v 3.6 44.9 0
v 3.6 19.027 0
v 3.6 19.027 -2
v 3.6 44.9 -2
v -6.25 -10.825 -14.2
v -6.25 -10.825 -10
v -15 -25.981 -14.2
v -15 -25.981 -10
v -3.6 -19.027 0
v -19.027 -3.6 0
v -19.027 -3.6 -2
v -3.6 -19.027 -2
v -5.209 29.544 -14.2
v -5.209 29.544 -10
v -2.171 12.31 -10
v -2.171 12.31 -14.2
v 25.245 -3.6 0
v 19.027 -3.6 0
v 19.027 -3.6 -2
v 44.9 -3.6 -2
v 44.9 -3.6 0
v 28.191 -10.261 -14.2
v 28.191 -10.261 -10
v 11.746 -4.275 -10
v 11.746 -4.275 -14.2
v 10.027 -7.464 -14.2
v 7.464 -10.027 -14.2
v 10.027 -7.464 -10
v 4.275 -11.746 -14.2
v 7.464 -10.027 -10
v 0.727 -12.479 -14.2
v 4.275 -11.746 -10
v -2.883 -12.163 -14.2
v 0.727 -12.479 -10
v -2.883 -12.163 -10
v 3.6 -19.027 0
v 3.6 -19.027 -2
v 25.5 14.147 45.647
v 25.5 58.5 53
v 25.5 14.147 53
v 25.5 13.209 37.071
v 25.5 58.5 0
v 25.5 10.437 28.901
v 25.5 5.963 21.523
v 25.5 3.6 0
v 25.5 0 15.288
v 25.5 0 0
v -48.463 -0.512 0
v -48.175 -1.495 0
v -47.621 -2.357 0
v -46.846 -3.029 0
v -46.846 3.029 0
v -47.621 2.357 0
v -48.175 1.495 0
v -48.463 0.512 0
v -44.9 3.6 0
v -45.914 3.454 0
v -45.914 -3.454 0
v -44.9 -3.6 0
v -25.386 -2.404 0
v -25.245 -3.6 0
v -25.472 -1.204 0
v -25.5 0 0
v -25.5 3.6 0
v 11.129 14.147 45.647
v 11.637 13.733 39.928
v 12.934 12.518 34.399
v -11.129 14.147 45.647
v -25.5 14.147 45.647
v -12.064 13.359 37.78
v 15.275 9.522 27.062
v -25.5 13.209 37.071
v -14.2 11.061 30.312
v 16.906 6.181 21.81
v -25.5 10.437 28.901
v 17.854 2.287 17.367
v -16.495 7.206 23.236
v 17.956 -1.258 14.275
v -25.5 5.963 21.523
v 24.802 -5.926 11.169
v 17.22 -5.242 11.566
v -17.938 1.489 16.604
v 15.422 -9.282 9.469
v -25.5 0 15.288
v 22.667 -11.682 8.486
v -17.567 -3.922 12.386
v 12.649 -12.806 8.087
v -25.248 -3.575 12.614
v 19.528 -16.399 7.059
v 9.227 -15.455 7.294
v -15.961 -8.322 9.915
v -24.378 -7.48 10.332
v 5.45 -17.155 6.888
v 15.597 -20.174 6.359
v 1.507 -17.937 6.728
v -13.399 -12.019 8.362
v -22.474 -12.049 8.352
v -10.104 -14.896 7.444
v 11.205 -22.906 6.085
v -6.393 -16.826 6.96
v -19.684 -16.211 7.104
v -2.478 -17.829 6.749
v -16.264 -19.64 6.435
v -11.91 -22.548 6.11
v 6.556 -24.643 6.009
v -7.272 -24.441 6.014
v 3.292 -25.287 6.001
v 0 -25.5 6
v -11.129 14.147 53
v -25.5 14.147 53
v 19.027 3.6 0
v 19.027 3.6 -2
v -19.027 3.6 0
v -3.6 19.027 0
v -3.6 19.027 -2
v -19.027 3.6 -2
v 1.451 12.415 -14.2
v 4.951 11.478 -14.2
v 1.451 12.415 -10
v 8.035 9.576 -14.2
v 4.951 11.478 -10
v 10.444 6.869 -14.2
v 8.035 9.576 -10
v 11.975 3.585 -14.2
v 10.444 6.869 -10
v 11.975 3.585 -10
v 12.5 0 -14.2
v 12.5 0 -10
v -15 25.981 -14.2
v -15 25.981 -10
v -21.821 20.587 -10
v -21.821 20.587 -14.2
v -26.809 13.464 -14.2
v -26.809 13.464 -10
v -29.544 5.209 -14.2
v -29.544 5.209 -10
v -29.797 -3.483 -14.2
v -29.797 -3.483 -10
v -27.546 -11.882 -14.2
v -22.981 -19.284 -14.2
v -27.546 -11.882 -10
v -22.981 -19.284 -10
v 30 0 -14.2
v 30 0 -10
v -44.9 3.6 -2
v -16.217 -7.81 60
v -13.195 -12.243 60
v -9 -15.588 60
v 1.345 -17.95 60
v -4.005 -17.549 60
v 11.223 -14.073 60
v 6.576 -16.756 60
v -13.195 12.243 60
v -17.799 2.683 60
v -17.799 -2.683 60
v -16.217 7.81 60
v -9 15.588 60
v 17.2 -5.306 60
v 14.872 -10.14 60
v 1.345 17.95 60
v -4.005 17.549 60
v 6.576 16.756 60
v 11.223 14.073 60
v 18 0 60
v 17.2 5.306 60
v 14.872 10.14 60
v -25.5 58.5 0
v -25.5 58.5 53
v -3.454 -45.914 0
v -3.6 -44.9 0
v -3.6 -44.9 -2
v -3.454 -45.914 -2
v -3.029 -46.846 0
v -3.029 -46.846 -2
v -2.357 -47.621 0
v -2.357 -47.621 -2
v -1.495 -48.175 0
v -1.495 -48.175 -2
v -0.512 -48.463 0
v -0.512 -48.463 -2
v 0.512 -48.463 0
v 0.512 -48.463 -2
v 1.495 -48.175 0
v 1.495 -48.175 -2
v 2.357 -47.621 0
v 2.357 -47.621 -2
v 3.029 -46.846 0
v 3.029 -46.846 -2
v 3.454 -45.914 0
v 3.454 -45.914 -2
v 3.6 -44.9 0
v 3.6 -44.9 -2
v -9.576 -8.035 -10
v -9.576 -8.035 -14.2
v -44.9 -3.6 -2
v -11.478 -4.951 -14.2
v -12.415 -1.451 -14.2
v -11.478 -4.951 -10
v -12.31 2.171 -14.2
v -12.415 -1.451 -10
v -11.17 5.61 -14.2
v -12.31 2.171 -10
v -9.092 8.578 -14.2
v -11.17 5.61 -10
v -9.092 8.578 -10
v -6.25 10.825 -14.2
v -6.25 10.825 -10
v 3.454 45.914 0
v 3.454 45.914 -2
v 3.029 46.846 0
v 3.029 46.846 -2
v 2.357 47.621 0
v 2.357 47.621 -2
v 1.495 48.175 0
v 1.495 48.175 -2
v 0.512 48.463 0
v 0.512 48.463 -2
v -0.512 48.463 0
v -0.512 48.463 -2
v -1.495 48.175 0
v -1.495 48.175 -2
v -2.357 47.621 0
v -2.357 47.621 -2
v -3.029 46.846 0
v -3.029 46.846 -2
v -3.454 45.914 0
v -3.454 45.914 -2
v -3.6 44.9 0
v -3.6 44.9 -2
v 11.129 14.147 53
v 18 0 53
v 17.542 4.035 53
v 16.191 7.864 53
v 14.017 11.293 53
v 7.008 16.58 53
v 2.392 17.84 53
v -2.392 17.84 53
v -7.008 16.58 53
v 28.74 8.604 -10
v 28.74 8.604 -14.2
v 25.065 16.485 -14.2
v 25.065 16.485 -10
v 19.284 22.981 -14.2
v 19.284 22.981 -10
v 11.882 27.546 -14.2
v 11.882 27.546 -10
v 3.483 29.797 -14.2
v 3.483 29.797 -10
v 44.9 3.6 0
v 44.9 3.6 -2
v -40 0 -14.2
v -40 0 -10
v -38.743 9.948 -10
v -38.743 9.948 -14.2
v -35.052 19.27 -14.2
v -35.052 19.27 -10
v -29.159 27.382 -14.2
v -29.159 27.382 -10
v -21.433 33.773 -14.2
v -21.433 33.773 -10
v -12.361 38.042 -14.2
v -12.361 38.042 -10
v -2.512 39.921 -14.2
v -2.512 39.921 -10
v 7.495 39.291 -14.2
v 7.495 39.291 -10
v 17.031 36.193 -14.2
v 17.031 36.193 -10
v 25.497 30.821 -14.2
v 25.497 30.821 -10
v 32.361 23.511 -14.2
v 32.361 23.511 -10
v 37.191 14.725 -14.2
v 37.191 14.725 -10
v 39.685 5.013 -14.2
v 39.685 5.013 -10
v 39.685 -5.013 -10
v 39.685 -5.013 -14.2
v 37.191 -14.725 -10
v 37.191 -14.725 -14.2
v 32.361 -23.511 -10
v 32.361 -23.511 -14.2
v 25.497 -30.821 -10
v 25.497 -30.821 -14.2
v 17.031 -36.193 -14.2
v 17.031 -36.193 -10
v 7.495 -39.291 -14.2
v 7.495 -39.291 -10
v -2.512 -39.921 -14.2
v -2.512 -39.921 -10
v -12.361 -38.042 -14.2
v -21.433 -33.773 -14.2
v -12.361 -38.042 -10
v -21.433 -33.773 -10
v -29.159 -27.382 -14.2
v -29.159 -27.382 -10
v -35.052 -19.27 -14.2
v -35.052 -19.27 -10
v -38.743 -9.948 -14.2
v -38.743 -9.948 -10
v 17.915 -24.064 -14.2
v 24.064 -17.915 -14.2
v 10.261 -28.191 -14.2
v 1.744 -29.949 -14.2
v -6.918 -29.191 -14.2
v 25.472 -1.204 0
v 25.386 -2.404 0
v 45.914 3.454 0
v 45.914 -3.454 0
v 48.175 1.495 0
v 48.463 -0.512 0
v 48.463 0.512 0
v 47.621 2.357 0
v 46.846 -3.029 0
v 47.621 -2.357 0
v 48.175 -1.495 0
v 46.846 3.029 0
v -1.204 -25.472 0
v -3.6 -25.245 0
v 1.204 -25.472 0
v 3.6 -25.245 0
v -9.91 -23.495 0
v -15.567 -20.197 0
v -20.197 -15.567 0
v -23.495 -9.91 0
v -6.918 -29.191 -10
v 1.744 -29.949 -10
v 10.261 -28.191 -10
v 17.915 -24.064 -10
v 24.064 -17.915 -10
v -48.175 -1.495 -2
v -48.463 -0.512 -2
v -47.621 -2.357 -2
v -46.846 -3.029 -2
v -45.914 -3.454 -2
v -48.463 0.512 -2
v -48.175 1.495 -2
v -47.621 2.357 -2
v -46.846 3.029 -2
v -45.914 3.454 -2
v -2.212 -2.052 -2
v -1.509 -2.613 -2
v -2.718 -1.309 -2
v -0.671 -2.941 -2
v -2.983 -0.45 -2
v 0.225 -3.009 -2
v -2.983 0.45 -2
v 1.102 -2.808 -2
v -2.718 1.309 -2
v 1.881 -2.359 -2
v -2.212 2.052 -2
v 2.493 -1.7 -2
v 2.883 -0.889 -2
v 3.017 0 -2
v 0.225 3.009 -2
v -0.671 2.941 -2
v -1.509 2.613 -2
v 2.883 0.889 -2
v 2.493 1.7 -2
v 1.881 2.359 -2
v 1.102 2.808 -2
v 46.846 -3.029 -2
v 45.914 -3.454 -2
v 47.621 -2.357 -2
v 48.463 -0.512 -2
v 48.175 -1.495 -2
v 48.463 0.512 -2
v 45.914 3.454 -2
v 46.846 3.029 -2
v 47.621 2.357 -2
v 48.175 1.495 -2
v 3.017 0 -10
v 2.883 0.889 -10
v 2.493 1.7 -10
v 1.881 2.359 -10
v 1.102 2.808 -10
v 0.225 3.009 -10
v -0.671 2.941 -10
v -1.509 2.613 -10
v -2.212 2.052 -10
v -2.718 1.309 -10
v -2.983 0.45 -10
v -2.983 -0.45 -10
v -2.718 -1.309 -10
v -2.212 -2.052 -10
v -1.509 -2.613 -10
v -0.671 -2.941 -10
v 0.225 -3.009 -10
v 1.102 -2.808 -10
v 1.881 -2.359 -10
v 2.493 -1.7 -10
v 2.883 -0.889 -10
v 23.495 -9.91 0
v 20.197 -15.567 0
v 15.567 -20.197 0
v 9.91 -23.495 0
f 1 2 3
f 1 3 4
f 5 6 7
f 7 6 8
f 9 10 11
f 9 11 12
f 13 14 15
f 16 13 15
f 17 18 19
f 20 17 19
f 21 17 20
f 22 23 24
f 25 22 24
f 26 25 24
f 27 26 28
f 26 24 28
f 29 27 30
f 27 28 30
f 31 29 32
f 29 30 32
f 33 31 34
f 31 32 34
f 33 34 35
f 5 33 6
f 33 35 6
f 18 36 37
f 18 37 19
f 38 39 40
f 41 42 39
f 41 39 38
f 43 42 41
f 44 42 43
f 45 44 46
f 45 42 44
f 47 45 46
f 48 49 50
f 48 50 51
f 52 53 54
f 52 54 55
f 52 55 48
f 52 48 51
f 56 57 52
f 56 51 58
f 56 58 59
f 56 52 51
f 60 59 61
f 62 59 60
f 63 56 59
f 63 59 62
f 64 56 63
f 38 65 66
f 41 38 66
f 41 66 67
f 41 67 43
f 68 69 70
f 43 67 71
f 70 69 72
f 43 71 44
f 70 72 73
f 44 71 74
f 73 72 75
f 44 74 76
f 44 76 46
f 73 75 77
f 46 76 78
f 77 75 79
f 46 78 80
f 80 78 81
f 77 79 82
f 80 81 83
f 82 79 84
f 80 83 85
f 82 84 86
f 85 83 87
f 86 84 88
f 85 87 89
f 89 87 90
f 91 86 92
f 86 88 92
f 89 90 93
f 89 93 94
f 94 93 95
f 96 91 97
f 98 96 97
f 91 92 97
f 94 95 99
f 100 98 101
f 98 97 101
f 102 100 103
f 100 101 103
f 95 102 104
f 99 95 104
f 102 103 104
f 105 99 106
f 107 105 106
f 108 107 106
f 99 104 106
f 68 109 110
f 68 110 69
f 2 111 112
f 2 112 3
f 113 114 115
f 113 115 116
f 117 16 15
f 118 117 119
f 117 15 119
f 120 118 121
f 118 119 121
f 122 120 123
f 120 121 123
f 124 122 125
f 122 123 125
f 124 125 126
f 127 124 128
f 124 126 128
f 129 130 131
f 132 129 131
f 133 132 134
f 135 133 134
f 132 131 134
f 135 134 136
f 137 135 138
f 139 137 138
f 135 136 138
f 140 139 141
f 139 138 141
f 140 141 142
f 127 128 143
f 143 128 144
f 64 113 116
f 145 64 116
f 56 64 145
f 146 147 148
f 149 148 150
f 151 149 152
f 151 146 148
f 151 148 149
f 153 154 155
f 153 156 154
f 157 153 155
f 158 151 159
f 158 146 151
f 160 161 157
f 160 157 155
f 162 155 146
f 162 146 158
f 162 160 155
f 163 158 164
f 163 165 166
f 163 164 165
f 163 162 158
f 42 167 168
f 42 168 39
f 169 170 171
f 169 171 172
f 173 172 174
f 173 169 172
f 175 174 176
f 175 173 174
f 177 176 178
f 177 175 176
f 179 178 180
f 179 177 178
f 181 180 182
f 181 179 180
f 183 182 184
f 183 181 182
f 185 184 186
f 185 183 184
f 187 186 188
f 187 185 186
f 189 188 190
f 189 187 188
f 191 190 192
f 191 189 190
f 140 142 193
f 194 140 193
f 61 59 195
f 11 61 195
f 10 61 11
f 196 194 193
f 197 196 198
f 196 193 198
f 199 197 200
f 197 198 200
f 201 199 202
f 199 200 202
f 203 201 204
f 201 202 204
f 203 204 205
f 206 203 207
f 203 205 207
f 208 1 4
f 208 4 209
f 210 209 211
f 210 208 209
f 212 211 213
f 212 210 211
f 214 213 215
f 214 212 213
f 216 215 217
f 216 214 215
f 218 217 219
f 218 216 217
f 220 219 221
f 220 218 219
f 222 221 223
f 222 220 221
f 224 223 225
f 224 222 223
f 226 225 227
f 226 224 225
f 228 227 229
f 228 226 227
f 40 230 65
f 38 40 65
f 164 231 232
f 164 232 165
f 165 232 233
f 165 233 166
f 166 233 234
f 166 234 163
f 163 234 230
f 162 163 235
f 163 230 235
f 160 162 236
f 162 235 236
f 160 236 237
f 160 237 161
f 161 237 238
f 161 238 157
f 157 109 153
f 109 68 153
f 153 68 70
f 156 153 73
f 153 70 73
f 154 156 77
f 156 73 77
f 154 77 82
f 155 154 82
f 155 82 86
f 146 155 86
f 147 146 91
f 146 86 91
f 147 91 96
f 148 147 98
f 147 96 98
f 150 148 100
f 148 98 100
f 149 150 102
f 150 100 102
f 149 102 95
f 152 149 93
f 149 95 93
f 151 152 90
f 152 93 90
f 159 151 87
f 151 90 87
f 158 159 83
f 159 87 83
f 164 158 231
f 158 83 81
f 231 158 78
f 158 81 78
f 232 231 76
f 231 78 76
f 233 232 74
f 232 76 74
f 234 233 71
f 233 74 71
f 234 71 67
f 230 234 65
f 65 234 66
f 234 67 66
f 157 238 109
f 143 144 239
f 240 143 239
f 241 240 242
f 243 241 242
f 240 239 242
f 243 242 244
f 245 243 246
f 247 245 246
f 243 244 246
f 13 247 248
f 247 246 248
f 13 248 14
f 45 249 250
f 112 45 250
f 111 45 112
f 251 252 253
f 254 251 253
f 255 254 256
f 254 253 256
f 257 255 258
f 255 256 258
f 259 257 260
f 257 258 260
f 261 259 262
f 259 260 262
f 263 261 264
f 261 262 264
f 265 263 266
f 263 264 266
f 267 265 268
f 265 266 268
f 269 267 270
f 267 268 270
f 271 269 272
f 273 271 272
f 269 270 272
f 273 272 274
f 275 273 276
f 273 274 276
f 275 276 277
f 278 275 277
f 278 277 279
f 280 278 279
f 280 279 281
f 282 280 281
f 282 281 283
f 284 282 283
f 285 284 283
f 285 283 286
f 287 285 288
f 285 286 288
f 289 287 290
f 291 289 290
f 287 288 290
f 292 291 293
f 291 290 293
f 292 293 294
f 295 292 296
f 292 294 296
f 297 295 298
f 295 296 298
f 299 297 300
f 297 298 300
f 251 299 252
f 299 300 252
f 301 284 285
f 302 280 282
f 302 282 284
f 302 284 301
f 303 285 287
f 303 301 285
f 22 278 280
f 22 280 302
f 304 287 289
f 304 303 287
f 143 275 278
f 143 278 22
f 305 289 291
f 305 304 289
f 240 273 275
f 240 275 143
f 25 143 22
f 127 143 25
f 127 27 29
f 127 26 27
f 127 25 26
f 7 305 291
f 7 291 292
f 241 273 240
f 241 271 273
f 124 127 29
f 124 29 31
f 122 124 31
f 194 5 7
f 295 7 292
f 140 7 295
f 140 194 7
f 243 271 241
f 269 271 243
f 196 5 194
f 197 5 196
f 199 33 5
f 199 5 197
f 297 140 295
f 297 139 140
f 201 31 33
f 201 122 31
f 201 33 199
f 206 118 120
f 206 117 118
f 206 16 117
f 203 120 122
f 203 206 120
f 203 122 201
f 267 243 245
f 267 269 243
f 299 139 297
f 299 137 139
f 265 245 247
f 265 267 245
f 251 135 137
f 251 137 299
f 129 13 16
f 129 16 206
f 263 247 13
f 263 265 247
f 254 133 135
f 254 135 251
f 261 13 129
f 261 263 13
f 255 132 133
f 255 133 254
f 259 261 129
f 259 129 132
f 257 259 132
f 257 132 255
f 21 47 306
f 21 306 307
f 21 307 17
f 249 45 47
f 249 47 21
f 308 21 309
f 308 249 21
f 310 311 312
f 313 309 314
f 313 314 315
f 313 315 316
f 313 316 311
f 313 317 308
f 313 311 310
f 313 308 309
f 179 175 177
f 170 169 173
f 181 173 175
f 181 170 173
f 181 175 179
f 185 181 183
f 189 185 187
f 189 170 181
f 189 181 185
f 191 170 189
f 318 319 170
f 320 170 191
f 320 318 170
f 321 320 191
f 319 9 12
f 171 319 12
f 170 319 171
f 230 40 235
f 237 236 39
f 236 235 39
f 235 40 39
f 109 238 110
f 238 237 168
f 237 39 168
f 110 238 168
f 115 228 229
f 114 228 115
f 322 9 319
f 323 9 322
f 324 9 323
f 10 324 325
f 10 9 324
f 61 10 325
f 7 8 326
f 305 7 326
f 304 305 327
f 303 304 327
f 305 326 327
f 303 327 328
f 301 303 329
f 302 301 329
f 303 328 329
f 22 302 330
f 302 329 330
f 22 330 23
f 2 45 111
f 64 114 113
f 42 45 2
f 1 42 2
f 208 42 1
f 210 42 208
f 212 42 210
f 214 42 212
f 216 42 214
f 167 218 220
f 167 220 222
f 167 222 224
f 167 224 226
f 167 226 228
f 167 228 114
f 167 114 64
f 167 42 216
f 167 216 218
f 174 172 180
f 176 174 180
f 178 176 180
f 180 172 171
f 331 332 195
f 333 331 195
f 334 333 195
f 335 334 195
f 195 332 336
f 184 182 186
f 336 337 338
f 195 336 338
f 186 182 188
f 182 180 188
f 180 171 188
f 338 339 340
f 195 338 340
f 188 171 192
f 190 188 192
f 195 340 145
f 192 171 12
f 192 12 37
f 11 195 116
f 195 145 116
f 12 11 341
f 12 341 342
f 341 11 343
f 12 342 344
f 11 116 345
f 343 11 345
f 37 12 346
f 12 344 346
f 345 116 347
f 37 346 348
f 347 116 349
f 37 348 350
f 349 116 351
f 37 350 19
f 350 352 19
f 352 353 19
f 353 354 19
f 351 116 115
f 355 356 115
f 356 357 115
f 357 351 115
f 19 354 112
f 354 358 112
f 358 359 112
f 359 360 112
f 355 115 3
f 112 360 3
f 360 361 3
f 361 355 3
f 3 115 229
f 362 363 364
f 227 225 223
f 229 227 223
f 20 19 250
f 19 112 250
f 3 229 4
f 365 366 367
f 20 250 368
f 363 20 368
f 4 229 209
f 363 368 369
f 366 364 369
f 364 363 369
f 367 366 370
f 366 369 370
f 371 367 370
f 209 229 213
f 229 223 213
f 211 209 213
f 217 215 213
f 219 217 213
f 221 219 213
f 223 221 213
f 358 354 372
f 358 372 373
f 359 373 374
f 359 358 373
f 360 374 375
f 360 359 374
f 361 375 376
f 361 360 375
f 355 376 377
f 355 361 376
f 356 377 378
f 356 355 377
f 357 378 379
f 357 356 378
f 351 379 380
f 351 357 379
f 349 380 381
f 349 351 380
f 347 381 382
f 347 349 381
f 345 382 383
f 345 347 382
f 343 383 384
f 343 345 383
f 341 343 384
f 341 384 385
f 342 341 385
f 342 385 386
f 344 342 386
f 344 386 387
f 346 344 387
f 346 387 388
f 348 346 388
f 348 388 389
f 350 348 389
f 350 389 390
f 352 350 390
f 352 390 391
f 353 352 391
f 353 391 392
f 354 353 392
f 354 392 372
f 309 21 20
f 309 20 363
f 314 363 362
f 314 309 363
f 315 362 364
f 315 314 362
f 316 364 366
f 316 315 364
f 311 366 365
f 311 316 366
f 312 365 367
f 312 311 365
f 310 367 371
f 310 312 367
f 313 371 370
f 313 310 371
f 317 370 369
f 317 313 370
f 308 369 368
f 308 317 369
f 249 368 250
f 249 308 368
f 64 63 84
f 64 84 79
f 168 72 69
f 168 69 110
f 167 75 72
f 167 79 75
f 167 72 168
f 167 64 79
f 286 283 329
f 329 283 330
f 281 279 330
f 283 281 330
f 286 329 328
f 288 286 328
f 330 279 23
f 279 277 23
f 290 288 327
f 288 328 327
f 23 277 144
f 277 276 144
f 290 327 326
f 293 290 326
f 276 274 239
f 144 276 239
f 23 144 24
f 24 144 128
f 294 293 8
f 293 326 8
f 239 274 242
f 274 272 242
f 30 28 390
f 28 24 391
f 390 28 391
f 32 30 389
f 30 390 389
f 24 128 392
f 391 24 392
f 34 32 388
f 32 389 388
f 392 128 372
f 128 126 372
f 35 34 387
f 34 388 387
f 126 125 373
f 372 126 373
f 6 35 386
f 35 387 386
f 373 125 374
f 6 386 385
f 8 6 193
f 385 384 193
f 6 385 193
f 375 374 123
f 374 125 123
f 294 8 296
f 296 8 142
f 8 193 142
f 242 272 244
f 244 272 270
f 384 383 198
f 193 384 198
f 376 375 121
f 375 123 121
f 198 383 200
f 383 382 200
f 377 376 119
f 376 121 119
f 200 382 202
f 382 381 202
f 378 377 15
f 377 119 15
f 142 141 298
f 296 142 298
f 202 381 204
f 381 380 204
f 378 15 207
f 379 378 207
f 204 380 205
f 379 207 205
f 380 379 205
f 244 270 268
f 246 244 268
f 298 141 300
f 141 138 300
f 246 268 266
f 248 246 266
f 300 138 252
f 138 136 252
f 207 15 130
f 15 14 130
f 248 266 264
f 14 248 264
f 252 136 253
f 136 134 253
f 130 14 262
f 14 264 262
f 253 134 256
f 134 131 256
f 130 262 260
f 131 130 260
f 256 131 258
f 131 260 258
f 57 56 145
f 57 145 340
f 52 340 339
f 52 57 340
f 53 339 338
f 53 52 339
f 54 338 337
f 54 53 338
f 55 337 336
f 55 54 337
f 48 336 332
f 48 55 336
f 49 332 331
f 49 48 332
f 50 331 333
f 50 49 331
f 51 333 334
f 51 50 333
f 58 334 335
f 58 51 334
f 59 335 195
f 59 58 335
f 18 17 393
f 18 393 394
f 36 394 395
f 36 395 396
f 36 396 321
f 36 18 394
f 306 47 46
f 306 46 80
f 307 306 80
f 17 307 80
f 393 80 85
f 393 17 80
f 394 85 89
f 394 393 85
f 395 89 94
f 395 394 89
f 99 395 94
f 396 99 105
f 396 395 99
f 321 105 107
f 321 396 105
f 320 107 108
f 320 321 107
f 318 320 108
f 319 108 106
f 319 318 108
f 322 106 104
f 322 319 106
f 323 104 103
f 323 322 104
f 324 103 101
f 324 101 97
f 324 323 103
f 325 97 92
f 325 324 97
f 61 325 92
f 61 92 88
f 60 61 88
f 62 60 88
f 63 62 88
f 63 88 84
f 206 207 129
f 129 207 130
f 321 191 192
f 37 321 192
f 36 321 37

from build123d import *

# Parameters (mm, degrees)
SKETCH2_R               = 18
BOSS_EXTRUDE1_DEPTH     = 60
BOSS_EXTRUDE2_DEPTH     = 53
BOSS_EXTRUDE3_DEPTH     = 2
CUT_EXTRUDE3_DEPTH      = 97.822001632
CUT_EXTRUDE3_DEPTH_BACK = 97.822001632
BOSS_EXTRUDE4_START     = -56
SKETCH6_R               = 18
BOSS_EXTRUDE4_DEPTH     = 56
SKETCH8_R               = 3.017040472
BOSS_EXTRUDE5_DEPTH     = 10
SKETCH9_R               = 40
BOSS_EXTRUDE6_DEPTH     = 4.2
CUT_EXTRUDE4_DEPTH      = 104.317471969
CIRPATTERN1_COUNT       = 3


with BuildPart() as part:
    # Sketch2 → Boss-Extrude1 (new body)
    with BuildSketch(Plane.XY):
        Circle(SKETCH2_R)
    extrude(amount=BOSS_EXTRUDE1_DEPTH)

    # Sketch3 → Boss-Extrude2 (add)
    with BuildSketch(Plane.XY):
        with BuildLine():
            Line((-25.5, 0), (-25.5, 58.5))
            Line((-25.5, 58.5), (25.5, 58.5))
            Line((25.5, 58.5), (25.5, 0))
            ThreePointArc((25.5, 0), (0, -25.5), (-25.5, 0))
        make_face()
    extrude(amount=BOSS_EXTRUDE2_DEPTH)

    # Sketch4 → Boss-Extrude3 (add)
    with BuildSketch(Plane.XY):
        with BuildLine():
            Line((-3.6, 19.027416998), (-19.027416998, 3.6))
            Line((-19.027416998, 3.6), (-44.9, 3.6))
            ThreePointArc((-44.9, 3.6), (-48.5, 0), (-44.9, -3.6))
            Line((-44.9, -3.6), (-19.027416998, -3.6))
            Line((-19.027416998, -3.6), (-3.6, -19.027416998))
            Line((-3.6, -19.027416998), (-3.6, -44.9))
            ThreePointArc((-3.6, -44.9), (0, -48.5), (3.6, -44.9))
            Line((3.6, -44.9), (3.6, -19.027416998))
            Line((3.6, -19.027416998), (19.027416998, -3.6))
            Line((19.027416998, -3.6), (44.9, -3.6))
            ThreePointArc((44.9, -3.6), (48.5, 0), (44.9, 3.6))
            Line((44.9, 3.6), (19.027416998, 3.6))
            Line((19.027416998, 3.6), (3.6, 19.027416998))
            Line((3.6, 19.027416998), (3.6, 44.9))
            ThreePointArc((3.6, 44.9), (0, 48.5), (-3.6, 44.9))
            Line((-3.6, 44.9), (-3.6, 19.027416998))
        make_face()
    extrude(amount=-BOSS_EXTRUDE3_DEPTH)

    # Sketch5 → Cut-Extrude3 (cut, two sides: drawn at the far end of the back side and taken through both)
    with BuildSketch(Plane(origin=(0, 0, 0), x_dir=(0, 0, -1), z_dir=(1, 0, 0)).offset(-CUT_EXTRUDE3_DEPTH_BACK)):
        with BuildLine():
            Line((-53, 14.147312787), (-45.647312787, 14.147312787))
            ThreePointArc((-45.647312787, 14.147312787), (-17.612429059, 2.534883727), (-6, -25.5))
            Line((-6, -25.5), (-53, -25.5))
            Line((-53, -25.5), (-53, 14.147312787))
        make_face()
    extrude(amount=CUT_EXTRUDE3_DEPTH + CUT_EXTRUDE3_DEPTH_BACK, mode=Mode.SUBTRACT)

    # Sketch6 → Boss-Extrude4 (add)
    with BuildSketch(Plane.XY.offset(60).offset(BOSS_EXTRUDE4_START)):
        Circle(SKETCH6_R)
    extrude(amount=BOSS_EXTRUDE4_DEPTH)

    # Sketch8 → Boss-Extrude5 (add)
    with BuildSketch(Plane.XY):
        Circle(SKETCH8_R)
    extrude(amount=-BOSS_EXTRUDE5_DEPTH)

    # Sketch9 → Boss-Extrude6 (add)
    with BuildSketch(Plane(origin=(0, 0, -10), x_dir=(-1, 0, 0), z_dir=(0, 0, -1))):
        Circle(SKETCH9_R)
    extrude(amount=BOSS_EXTRUDE6_DEPTH)

    # Sketch11 → Cut-Extrude4 (cut, through all)
    with BuildSketch(Plane.XY.offset(-10)):
        with BuildLine():
            Line((12.5, 0), (30, 0))
            ThreePointArc((30, 0), (19.283628291, 22.981333294), (-5.20944533, 29.54423259))
            Line((-5.20944533, 29.54423259), (-2.170602221, 12.310096913))
            ThreePointArc((-2.170602221, 12.310096913), (8.034845121, 9.575555539), (12.5, 0))
        make_face()
    cut_extrude4 = extrude(amount=-CUT_EXTRUDE4_DEPTH, mode=Mode.SUBTRACT)

    # CirPattern1: Cut-Extrude4 ×3 about axis
    cirpattern1_axis = Axis((0, 0, -10), (0, 0, 1))
    for i in range(1, CIRPATTERN1_COUNT):
        add(cut_extrude4.rotate(cirpattern1_axis, i * 360 / CIRPATTERN1_COUNT), mode=Mode.SUBTRACT)


solid = part.part
